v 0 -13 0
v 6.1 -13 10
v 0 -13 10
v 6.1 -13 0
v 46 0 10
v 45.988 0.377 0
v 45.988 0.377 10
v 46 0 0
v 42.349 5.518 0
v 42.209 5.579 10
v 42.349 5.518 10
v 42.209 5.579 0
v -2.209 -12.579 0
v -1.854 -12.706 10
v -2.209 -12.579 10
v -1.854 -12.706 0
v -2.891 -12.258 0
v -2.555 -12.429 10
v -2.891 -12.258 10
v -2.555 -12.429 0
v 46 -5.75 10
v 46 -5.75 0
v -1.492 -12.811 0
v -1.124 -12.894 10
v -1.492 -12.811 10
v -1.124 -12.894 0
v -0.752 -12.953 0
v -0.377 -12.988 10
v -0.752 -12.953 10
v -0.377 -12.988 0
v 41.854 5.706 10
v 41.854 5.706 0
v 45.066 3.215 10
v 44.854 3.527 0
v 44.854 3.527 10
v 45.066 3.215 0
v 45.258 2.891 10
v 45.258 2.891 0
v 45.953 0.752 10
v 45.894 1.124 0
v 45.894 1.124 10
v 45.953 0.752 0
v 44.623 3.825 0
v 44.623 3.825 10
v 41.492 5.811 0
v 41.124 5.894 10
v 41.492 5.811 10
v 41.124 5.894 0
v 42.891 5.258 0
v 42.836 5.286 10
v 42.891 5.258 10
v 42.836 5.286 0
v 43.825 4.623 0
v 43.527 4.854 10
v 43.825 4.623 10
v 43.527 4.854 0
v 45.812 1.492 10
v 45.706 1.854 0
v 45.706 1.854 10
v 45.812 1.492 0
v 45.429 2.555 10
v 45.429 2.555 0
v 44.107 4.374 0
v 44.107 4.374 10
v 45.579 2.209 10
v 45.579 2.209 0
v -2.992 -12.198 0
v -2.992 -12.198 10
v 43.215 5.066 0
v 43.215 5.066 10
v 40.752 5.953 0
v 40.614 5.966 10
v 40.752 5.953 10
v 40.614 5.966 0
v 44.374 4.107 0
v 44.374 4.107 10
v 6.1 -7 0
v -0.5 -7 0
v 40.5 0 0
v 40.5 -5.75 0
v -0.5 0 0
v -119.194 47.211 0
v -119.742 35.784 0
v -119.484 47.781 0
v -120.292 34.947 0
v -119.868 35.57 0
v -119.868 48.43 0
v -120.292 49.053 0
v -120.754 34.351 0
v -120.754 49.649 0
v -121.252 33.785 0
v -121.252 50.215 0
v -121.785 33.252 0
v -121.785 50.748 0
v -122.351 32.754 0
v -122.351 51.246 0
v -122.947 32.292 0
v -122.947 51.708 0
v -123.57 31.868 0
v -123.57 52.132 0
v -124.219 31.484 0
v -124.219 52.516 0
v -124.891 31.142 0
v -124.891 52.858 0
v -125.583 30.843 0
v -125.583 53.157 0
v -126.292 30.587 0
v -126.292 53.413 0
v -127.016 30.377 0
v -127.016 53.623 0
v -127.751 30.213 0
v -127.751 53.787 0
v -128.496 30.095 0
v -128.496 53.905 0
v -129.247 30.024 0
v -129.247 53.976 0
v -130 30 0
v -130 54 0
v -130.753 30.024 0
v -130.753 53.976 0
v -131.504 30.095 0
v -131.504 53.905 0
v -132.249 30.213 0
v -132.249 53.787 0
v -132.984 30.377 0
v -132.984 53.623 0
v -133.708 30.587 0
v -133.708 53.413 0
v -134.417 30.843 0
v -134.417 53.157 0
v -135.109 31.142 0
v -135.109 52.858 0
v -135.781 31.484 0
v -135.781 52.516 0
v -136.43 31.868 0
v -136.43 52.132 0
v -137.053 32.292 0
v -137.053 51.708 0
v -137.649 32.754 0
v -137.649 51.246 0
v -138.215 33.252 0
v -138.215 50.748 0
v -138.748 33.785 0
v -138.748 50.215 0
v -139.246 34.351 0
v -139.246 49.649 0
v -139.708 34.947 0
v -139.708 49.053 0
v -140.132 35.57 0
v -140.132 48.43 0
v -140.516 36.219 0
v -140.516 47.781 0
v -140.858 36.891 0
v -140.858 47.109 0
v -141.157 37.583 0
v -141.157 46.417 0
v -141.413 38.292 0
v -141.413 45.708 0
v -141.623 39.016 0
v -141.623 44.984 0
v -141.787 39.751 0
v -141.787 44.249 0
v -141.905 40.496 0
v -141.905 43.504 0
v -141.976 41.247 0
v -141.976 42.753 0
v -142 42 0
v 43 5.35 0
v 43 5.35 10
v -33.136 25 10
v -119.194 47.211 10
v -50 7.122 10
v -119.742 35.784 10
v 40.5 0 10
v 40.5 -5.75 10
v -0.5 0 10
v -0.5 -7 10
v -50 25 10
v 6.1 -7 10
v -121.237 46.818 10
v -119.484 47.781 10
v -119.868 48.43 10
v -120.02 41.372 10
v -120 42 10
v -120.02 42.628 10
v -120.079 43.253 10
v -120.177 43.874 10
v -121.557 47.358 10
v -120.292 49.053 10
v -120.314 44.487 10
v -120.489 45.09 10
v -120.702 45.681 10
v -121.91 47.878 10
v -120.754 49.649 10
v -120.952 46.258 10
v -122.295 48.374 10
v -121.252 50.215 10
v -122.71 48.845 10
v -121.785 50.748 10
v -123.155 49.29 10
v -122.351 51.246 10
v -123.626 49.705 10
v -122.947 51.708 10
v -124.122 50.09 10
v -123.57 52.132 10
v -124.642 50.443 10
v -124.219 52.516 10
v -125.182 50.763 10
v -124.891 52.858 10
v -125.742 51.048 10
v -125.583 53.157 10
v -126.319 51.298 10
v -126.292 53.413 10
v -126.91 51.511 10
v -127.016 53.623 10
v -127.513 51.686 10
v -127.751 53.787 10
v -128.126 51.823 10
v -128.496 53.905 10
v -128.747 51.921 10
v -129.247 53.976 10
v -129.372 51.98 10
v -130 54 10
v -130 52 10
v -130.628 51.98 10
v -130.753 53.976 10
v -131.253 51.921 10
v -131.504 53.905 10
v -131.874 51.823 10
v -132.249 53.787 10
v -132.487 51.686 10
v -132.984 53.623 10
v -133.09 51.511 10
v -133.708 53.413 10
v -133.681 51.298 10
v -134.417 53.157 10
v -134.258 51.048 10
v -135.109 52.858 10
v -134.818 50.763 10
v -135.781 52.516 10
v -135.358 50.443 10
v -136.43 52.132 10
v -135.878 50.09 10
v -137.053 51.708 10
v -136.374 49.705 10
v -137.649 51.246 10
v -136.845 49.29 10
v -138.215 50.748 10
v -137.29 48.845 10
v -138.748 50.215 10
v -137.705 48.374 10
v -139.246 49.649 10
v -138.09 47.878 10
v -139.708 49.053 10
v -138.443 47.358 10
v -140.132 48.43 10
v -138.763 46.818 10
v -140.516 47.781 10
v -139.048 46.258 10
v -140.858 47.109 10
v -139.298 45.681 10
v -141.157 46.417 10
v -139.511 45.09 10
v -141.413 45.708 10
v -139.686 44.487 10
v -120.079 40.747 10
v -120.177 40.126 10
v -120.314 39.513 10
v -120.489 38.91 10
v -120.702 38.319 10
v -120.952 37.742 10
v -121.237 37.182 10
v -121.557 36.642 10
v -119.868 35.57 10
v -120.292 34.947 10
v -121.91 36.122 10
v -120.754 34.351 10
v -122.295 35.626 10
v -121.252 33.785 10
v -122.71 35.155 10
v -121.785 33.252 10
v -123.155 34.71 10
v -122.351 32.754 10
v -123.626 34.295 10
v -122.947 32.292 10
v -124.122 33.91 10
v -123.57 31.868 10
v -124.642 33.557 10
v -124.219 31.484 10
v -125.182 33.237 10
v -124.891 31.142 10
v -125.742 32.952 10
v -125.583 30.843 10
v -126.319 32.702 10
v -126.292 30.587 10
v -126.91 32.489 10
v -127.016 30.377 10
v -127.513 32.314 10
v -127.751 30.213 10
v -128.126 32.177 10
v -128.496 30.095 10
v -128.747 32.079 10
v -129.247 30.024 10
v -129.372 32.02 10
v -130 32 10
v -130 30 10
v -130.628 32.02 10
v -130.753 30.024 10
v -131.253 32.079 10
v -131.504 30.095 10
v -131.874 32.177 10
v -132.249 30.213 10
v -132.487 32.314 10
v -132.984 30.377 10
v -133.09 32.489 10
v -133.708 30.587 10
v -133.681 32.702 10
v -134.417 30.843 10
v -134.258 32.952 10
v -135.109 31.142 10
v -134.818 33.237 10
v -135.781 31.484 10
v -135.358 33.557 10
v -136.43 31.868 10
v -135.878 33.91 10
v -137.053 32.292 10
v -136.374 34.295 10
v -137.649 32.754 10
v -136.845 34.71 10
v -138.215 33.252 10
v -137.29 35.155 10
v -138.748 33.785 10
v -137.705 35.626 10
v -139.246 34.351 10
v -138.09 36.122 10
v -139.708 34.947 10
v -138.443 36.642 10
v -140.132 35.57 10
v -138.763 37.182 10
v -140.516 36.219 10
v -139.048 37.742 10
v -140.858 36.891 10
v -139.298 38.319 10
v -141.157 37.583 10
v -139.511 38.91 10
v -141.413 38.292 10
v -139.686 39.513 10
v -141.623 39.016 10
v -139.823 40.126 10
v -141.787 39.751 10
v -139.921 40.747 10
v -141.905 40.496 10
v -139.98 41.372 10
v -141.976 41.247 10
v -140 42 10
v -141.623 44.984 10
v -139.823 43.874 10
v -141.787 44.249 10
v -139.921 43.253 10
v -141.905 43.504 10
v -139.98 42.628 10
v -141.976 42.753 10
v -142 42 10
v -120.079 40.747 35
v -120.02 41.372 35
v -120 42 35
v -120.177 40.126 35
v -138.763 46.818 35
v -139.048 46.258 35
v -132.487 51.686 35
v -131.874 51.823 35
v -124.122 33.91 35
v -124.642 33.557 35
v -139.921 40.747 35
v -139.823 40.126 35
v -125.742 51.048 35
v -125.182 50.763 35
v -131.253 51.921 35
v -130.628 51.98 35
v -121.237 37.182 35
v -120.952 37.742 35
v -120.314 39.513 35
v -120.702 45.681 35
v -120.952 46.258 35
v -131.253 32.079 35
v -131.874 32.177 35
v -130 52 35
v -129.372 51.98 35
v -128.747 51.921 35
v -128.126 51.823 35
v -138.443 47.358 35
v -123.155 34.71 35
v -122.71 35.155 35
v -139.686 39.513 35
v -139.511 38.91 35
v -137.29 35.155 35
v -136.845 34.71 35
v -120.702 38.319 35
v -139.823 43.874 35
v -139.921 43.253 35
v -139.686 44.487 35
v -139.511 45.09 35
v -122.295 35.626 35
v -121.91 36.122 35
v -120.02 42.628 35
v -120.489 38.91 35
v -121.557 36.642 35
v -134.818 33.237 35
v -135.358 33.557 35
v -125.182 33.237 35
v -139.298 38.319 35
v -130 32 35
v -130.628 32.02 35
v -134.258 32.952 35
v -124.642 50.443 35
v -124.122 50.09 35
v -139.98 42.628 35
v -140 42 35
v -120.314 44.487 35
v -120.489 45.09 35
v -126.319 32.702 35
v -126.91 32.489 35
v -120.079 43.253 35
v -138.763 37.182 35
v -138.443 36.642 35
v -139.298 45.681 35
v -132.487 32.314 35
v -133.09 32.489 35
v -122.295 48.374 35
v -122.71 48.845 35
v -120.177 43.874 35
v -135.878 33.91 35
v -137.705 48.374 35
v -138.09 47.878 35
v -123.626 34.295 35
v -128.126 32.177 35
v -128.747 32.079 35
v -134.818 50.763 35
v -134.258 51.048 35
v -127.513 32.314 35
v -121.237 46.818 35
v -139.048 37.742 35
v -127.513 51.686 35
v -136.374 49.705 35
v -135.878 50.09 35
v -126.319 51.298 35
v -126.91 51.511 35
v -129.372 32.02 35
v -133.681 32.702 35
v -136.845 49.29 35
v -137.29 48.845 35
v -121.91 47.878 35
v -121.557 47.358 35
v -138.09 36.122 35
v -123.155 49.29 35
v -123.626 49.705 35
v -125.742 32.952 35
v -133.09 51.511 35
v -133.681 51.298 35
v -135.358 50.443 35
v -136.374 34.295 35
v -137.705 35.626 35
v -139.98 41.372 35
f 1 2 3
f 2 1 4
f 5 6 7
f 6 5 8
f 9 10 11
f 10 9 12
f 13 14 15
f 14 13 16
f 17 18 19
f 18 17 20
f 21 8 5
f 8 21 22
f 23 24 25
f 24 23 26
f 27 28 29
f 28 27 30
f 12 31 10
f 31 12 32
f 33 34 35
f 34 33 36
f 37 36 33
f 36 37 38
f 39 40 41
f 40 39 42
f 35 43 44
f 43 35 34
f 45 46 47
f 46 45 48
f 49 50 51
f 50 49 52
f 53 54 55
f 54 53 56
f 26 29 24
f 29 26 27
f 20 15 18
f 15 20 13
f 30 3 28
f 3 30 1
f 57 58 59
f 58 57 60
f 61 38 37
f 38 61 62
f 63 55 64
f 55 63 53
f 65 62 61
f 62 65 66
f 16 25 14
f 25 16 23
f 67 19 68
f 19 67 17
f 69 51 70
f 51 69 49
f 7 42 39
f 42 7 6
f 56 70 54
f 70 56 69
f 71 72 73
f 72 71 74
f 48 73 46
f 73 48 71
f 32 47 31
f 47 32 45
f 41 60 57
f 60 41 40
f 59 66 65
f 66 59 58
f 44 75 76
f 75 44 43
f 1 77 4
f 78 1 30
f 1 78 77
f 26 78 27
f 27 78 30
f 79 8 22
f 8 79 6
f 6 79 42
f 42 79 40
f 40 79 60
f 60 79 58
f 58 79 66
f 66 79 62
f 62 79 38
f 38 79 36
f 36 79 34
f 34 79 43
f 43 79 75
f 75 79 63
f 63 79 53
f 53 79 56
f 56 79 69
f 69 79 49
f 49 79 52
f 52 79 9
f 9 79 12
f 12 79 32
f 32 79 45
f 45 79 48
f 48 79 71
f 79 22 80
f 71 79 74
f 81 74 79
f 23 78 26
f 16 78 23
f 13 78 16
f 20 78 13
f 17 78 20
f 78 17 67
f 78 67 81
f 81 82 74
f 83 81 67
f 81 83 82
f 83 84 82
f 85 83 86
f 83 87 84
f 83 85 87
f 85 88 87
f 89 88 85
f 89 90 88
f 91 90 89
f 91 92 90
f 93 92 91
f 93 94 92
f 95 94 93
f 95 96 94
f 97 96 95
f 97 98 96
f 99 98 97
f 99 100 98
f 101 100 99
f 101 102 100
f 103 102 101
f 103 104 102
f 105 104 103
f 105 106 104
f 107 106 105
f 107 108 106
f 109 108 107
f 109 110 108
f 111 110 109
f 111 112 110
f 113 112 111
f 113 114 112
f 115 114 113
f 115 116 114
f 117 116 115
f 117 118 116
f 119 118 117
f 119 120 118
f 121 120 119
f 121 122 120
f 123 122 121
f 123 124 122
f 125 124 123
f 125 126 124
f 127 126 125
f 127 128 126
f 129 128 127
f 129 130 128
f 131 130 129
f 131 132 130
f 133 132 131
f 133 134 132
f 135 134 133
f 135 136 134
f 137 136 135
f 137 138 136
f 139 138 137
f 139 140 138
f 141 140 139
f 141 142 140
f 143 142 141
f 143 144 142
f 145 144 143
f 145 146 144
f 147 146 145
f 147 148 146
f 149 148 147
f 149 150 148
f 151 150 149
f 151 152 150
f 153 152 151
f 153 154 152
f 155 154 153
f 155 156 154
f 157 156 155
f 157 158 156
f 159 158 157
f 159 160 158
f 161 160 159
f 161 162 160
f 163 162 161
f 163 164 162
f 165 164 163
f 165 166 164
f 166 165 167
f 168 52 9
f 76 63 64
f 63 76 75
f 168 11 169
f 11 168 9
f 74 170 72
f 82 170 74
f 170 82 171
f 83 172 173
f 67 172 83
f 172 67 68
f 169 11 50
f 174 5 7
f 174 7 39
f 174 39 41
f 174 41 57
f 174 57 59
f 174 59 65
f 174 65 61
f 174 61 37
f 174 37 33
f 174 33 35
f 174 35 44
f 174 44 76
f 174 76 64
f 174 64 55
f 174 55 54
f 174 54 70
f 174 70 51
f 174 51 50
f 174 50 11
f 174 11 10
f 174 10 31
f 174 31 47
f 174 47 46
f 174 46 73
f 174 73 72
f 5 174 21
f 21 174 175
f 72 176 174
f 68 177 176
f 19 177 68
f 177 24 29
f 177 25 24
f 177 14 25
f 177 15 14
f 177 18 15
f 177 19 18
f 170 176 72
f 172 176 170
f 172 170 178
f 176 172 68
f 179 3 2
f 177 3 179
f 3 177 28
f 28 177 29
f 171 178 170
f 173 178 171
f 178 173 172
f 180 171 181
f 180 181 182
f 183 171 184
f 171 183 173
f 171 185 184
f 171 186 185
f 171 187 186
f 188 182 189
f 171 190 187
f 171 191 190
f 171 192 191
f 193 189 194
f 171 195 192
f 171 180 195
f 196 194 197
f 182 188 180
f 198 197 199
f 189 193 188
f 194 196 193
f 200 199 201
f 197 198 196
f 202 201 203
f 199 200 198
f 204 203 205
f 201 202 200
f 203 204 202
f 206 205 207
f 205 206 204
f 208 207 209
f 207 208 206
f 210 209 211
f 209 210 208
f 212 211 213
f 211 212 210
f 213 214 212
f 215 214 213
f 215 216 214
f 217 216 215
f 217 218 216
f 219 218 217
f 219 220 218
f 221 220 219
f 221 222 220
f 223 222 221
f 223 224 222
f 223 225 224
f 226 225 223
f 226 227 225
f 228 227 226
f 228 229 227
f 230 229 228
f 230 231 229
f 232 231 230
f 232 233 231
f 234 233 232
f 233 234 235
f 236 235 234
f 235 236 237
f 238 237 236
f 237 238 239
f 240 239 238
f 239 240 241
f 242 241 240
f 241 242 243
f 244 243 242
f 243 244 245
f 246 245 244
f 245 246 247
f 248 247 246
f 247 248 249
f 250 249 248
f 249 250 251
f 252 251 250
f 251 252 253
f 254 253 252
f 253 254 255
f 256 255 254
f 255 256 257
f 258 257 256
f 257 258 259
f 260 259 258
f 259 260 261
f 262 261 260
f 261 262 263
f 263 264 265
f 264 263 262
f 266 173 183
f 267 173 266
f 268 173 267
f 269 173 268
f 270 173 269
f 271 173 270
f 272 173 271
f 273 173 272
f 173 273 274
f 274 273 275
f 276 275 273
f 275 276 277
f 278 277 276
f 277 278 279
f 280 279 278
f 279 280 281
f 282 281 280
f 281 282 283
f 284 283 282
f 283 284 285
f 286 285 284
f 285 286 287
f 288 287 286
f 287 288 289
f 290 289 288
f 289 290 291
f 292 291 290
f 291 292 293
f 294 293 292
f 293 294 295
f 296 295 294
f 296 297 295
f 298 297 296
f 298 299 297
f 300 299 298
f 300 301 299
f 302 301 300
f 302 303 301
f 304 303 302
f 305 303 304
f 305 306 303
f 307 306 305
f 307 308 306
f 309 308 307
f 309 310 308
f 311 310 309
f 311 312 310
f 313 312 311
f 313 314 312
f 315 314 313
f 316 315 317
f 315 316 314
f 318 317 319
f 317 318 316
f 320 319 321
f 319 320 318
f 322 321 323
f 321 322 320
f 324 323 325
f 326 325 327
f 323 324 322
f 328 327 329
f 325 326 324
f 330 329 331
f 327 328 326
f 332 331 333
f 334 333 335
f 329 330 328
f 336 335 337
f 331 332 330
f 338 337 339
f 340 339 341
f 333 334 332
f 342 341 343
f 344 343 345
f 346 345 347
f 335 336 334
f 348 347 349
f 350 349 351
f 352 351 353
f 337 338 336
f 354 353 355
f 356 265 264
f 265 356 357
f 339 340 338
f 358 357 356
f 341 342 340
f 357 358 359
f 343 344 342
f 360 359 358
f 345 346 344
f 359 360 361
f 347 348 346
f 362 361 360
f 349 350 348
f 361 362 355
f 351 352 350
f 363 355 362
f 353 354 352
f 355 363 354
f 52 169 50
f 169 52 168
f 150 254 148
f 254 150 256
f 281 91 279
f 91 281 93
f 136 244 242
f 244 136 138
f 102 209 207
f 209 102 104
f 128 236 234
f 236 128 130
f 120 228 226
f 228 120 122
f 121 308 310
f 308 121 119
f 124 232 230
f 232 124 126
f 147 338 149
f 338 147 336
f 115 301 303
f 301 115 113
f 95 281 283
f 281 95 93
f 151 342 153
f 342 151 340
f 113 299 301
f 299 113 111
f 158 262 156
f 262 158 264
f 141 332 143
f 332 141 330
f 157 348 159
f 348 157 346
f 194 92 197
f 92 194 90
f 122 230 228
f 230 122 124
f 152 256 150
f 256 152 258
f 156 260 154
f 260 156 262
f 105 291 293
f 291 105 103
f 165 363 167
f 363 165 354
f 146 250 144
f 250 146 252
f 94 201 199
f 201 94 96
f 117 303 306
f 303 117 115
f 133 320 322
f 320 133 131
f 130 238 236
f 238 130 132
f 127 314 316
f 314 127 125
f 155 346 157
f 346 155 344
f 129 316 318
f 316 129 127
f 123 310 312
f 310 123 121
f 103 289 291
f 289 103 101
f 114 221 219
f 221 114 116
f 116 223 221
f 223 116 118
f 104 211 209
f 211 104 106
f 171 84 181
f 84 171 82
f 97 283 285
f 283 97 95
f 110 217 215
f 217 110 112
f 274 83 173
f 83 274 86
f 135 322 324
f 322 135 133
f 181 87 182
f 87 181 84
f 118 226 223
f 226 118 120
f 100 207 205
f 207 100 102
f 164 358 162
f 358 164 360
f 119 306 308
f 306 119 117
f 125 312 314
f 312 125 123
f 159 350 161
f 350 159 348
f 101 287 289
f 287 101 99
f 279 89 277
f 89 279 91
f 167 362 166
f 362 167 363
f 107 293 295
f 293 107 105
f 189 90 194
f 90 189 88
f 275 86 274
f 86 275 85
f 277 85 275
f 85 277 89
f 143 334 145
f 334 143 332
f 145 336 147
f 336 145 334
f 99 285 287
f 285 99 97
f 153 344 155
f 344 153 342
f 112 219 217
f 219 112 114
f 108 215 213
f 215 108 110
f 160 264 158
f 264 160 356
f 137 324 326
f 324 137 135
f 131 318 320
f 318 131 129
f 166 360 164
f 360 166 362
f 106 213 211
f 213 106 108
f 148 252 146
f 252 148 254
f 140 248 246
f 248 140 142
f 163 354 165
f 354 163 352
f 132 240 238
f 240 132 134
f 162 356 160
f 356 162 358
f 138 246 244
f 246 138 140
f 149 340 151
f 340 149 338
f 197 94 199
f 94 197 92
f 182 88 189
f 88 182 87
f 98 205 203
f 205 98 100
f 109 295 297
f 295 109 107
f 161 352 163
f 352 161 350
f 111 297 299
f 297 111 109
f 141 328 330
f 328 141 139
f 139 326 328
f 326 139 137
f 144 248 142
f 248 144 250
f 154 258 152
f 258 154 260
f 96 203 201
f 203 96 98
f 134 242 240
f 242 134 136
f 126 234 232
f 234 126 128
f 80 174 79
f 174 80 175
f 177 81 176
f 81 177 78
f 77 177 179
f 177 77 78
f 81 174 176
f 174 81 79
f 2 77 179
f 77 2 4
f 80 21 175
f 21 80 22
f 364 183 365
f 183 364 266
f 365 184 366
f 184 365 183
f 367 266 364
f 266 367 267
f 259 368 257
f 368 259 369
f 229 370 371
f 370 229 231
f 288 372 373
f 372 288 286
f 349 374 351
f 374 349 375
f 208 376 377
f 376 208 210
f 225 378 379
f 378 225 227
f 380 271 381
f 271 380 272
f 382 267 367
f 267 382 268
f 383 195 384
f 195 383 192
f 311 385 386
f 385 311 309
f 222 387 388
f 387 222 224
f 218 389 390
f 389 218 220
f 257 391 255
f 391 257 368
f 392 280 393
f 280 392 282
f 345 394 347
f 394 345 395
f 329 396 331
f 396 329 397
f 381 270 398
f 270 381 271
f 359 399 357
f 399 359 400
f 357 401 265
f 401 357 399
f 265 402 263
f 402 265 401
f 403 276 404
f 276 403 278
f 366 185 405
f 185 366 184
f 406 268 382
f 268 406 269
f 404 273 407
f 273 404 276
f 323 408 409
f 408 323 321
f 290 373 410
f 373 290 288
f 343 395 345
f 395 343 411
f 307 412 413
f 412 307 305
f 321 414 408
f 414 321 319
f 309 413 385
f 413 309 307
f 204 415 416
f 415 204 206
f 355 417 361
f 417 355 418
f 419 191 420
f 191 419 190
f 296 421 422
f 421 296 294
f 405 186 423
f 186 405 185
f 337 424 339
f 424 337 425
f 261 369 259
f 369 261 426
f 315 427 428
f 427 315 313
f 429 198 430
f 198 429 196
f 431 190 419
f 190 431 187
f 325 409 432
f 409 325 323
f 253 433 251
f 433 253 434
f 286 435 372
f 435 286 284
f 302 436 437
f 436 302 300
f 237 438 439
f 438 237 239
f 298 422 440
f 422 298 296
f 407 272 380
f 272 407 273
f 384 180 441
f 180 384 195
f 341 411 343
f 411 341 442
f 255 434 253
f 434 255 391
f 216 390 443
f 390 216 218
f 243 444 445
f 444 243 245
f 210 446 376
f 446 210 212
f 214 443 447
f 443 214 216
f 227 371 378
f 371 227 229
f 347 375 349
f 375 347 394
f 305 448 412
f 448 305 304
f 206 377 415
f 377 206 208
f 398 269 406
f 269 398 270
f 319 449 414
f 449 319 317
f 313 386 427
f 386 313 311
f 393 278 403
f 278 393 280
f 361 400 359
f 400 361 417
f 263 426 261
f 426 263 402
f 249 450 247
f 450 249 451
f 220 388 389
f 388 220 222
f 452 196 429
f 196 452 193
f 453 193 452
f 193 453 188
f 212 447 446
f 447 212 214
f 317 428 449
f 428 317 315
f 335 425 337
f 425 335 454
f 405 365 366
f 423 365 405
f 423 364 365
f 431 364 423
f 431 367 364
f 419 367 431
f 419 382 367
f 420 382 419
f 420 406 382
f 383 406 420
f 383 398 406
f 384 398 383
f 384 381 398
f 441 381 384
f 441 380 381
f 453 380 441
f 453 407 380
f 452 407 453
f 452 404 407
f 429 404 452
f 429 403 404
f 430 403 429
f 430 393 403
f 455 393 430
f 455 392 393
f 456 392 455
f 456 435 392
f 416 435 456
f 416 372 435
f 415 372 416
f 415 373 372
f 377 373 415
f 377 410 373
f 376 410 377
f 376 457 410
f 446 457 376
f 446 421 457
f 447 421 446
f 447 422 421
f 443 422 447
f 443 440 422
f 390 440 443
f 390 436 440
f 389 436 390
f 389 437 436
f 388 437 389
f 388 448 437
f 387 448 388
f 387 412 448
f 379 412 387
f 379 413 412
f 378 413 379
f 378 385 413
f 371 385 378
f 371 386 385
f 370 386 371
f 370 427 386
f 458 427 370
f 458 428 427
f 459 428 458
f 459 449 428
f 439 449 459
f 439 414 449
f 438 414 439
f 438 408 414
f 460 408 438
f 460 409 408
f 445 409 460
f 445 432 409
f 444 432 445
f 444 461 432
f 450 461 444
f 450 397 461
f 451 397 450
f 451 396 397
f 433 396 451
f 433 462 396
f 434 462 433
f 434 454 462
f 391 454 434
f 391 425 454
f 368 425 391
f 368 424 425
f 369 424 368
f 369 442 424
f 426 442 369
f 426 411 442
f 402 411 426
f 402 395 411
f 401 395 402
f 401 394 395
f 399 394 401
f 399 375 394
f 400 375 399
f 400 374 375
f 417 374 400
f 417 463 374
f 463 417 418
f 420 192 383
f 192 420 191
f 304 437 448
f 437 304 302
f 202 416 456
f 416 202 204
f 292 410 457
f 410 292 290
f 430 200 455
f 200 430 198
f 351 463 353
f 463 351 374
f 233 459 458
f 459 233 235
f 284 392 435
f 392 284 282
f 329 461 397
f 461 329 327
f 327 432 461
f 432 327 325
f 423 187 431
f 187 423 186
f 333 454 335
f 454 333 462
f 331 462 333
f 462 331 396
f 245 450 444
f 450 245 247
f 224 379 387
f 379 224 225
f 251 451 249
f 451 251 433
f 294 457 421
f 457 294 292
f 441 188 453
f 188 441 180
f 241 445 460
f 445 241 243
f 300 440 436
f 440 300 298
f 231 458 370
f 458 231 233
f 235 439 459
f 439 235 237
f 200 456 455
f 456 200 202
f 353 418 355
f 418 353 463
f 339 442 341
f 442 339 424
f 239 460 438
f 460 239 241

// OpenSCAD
//-------------------------------------------------------------------------------------------
//-- Soporte para rollo de filamento de prusa i3. (c) Antonio Castro Gómez
//-------------------------------------------------------------------------------------------
//-- Released under the GPL license
//-------------------------------------------------------------------------------------------

mirror([ 0, 1, 0 ])
{
	difference()
	{
		union()
		{

			//enganche con marco
			difference()
			{
				union()
				{
					minkowski()
					{
						cylinder(h=8, r=6, $fn=100, center=true);
						translate([20,3.5,8])cube(size=[40,7,8], center=true);
					}

					//Cuerpo spooler
					linear_extrude(height = 10)
					polygon(points=[	[-2.5,12.4], /*pico enganche superior*/
									[43,-5.35], /*pico encganche inferior*/
									[-130,-50],
									[-130,-40] ]);

					//base soporte
					translate([-130,-42,5])cylinder(h=10, r=12, $fn=100, center=true);
				}
					translate([20,3.5,10])cube(size=[41,7,25], center=true);
					translate([26.1,9.5,10])cube(size=[40,7.5,25], center=true);
					translate([0,0,18])cube(size=[100,50,16], center=true);
					translate([-130,-42,-1])cylinder(h=30, r=1.8, $fn=100, center=true);
			}
			translate([-130,-42,17.5])cylinder(h=35, r=10, $fn=100, center=true);
		}//Fin union()
	}

}
